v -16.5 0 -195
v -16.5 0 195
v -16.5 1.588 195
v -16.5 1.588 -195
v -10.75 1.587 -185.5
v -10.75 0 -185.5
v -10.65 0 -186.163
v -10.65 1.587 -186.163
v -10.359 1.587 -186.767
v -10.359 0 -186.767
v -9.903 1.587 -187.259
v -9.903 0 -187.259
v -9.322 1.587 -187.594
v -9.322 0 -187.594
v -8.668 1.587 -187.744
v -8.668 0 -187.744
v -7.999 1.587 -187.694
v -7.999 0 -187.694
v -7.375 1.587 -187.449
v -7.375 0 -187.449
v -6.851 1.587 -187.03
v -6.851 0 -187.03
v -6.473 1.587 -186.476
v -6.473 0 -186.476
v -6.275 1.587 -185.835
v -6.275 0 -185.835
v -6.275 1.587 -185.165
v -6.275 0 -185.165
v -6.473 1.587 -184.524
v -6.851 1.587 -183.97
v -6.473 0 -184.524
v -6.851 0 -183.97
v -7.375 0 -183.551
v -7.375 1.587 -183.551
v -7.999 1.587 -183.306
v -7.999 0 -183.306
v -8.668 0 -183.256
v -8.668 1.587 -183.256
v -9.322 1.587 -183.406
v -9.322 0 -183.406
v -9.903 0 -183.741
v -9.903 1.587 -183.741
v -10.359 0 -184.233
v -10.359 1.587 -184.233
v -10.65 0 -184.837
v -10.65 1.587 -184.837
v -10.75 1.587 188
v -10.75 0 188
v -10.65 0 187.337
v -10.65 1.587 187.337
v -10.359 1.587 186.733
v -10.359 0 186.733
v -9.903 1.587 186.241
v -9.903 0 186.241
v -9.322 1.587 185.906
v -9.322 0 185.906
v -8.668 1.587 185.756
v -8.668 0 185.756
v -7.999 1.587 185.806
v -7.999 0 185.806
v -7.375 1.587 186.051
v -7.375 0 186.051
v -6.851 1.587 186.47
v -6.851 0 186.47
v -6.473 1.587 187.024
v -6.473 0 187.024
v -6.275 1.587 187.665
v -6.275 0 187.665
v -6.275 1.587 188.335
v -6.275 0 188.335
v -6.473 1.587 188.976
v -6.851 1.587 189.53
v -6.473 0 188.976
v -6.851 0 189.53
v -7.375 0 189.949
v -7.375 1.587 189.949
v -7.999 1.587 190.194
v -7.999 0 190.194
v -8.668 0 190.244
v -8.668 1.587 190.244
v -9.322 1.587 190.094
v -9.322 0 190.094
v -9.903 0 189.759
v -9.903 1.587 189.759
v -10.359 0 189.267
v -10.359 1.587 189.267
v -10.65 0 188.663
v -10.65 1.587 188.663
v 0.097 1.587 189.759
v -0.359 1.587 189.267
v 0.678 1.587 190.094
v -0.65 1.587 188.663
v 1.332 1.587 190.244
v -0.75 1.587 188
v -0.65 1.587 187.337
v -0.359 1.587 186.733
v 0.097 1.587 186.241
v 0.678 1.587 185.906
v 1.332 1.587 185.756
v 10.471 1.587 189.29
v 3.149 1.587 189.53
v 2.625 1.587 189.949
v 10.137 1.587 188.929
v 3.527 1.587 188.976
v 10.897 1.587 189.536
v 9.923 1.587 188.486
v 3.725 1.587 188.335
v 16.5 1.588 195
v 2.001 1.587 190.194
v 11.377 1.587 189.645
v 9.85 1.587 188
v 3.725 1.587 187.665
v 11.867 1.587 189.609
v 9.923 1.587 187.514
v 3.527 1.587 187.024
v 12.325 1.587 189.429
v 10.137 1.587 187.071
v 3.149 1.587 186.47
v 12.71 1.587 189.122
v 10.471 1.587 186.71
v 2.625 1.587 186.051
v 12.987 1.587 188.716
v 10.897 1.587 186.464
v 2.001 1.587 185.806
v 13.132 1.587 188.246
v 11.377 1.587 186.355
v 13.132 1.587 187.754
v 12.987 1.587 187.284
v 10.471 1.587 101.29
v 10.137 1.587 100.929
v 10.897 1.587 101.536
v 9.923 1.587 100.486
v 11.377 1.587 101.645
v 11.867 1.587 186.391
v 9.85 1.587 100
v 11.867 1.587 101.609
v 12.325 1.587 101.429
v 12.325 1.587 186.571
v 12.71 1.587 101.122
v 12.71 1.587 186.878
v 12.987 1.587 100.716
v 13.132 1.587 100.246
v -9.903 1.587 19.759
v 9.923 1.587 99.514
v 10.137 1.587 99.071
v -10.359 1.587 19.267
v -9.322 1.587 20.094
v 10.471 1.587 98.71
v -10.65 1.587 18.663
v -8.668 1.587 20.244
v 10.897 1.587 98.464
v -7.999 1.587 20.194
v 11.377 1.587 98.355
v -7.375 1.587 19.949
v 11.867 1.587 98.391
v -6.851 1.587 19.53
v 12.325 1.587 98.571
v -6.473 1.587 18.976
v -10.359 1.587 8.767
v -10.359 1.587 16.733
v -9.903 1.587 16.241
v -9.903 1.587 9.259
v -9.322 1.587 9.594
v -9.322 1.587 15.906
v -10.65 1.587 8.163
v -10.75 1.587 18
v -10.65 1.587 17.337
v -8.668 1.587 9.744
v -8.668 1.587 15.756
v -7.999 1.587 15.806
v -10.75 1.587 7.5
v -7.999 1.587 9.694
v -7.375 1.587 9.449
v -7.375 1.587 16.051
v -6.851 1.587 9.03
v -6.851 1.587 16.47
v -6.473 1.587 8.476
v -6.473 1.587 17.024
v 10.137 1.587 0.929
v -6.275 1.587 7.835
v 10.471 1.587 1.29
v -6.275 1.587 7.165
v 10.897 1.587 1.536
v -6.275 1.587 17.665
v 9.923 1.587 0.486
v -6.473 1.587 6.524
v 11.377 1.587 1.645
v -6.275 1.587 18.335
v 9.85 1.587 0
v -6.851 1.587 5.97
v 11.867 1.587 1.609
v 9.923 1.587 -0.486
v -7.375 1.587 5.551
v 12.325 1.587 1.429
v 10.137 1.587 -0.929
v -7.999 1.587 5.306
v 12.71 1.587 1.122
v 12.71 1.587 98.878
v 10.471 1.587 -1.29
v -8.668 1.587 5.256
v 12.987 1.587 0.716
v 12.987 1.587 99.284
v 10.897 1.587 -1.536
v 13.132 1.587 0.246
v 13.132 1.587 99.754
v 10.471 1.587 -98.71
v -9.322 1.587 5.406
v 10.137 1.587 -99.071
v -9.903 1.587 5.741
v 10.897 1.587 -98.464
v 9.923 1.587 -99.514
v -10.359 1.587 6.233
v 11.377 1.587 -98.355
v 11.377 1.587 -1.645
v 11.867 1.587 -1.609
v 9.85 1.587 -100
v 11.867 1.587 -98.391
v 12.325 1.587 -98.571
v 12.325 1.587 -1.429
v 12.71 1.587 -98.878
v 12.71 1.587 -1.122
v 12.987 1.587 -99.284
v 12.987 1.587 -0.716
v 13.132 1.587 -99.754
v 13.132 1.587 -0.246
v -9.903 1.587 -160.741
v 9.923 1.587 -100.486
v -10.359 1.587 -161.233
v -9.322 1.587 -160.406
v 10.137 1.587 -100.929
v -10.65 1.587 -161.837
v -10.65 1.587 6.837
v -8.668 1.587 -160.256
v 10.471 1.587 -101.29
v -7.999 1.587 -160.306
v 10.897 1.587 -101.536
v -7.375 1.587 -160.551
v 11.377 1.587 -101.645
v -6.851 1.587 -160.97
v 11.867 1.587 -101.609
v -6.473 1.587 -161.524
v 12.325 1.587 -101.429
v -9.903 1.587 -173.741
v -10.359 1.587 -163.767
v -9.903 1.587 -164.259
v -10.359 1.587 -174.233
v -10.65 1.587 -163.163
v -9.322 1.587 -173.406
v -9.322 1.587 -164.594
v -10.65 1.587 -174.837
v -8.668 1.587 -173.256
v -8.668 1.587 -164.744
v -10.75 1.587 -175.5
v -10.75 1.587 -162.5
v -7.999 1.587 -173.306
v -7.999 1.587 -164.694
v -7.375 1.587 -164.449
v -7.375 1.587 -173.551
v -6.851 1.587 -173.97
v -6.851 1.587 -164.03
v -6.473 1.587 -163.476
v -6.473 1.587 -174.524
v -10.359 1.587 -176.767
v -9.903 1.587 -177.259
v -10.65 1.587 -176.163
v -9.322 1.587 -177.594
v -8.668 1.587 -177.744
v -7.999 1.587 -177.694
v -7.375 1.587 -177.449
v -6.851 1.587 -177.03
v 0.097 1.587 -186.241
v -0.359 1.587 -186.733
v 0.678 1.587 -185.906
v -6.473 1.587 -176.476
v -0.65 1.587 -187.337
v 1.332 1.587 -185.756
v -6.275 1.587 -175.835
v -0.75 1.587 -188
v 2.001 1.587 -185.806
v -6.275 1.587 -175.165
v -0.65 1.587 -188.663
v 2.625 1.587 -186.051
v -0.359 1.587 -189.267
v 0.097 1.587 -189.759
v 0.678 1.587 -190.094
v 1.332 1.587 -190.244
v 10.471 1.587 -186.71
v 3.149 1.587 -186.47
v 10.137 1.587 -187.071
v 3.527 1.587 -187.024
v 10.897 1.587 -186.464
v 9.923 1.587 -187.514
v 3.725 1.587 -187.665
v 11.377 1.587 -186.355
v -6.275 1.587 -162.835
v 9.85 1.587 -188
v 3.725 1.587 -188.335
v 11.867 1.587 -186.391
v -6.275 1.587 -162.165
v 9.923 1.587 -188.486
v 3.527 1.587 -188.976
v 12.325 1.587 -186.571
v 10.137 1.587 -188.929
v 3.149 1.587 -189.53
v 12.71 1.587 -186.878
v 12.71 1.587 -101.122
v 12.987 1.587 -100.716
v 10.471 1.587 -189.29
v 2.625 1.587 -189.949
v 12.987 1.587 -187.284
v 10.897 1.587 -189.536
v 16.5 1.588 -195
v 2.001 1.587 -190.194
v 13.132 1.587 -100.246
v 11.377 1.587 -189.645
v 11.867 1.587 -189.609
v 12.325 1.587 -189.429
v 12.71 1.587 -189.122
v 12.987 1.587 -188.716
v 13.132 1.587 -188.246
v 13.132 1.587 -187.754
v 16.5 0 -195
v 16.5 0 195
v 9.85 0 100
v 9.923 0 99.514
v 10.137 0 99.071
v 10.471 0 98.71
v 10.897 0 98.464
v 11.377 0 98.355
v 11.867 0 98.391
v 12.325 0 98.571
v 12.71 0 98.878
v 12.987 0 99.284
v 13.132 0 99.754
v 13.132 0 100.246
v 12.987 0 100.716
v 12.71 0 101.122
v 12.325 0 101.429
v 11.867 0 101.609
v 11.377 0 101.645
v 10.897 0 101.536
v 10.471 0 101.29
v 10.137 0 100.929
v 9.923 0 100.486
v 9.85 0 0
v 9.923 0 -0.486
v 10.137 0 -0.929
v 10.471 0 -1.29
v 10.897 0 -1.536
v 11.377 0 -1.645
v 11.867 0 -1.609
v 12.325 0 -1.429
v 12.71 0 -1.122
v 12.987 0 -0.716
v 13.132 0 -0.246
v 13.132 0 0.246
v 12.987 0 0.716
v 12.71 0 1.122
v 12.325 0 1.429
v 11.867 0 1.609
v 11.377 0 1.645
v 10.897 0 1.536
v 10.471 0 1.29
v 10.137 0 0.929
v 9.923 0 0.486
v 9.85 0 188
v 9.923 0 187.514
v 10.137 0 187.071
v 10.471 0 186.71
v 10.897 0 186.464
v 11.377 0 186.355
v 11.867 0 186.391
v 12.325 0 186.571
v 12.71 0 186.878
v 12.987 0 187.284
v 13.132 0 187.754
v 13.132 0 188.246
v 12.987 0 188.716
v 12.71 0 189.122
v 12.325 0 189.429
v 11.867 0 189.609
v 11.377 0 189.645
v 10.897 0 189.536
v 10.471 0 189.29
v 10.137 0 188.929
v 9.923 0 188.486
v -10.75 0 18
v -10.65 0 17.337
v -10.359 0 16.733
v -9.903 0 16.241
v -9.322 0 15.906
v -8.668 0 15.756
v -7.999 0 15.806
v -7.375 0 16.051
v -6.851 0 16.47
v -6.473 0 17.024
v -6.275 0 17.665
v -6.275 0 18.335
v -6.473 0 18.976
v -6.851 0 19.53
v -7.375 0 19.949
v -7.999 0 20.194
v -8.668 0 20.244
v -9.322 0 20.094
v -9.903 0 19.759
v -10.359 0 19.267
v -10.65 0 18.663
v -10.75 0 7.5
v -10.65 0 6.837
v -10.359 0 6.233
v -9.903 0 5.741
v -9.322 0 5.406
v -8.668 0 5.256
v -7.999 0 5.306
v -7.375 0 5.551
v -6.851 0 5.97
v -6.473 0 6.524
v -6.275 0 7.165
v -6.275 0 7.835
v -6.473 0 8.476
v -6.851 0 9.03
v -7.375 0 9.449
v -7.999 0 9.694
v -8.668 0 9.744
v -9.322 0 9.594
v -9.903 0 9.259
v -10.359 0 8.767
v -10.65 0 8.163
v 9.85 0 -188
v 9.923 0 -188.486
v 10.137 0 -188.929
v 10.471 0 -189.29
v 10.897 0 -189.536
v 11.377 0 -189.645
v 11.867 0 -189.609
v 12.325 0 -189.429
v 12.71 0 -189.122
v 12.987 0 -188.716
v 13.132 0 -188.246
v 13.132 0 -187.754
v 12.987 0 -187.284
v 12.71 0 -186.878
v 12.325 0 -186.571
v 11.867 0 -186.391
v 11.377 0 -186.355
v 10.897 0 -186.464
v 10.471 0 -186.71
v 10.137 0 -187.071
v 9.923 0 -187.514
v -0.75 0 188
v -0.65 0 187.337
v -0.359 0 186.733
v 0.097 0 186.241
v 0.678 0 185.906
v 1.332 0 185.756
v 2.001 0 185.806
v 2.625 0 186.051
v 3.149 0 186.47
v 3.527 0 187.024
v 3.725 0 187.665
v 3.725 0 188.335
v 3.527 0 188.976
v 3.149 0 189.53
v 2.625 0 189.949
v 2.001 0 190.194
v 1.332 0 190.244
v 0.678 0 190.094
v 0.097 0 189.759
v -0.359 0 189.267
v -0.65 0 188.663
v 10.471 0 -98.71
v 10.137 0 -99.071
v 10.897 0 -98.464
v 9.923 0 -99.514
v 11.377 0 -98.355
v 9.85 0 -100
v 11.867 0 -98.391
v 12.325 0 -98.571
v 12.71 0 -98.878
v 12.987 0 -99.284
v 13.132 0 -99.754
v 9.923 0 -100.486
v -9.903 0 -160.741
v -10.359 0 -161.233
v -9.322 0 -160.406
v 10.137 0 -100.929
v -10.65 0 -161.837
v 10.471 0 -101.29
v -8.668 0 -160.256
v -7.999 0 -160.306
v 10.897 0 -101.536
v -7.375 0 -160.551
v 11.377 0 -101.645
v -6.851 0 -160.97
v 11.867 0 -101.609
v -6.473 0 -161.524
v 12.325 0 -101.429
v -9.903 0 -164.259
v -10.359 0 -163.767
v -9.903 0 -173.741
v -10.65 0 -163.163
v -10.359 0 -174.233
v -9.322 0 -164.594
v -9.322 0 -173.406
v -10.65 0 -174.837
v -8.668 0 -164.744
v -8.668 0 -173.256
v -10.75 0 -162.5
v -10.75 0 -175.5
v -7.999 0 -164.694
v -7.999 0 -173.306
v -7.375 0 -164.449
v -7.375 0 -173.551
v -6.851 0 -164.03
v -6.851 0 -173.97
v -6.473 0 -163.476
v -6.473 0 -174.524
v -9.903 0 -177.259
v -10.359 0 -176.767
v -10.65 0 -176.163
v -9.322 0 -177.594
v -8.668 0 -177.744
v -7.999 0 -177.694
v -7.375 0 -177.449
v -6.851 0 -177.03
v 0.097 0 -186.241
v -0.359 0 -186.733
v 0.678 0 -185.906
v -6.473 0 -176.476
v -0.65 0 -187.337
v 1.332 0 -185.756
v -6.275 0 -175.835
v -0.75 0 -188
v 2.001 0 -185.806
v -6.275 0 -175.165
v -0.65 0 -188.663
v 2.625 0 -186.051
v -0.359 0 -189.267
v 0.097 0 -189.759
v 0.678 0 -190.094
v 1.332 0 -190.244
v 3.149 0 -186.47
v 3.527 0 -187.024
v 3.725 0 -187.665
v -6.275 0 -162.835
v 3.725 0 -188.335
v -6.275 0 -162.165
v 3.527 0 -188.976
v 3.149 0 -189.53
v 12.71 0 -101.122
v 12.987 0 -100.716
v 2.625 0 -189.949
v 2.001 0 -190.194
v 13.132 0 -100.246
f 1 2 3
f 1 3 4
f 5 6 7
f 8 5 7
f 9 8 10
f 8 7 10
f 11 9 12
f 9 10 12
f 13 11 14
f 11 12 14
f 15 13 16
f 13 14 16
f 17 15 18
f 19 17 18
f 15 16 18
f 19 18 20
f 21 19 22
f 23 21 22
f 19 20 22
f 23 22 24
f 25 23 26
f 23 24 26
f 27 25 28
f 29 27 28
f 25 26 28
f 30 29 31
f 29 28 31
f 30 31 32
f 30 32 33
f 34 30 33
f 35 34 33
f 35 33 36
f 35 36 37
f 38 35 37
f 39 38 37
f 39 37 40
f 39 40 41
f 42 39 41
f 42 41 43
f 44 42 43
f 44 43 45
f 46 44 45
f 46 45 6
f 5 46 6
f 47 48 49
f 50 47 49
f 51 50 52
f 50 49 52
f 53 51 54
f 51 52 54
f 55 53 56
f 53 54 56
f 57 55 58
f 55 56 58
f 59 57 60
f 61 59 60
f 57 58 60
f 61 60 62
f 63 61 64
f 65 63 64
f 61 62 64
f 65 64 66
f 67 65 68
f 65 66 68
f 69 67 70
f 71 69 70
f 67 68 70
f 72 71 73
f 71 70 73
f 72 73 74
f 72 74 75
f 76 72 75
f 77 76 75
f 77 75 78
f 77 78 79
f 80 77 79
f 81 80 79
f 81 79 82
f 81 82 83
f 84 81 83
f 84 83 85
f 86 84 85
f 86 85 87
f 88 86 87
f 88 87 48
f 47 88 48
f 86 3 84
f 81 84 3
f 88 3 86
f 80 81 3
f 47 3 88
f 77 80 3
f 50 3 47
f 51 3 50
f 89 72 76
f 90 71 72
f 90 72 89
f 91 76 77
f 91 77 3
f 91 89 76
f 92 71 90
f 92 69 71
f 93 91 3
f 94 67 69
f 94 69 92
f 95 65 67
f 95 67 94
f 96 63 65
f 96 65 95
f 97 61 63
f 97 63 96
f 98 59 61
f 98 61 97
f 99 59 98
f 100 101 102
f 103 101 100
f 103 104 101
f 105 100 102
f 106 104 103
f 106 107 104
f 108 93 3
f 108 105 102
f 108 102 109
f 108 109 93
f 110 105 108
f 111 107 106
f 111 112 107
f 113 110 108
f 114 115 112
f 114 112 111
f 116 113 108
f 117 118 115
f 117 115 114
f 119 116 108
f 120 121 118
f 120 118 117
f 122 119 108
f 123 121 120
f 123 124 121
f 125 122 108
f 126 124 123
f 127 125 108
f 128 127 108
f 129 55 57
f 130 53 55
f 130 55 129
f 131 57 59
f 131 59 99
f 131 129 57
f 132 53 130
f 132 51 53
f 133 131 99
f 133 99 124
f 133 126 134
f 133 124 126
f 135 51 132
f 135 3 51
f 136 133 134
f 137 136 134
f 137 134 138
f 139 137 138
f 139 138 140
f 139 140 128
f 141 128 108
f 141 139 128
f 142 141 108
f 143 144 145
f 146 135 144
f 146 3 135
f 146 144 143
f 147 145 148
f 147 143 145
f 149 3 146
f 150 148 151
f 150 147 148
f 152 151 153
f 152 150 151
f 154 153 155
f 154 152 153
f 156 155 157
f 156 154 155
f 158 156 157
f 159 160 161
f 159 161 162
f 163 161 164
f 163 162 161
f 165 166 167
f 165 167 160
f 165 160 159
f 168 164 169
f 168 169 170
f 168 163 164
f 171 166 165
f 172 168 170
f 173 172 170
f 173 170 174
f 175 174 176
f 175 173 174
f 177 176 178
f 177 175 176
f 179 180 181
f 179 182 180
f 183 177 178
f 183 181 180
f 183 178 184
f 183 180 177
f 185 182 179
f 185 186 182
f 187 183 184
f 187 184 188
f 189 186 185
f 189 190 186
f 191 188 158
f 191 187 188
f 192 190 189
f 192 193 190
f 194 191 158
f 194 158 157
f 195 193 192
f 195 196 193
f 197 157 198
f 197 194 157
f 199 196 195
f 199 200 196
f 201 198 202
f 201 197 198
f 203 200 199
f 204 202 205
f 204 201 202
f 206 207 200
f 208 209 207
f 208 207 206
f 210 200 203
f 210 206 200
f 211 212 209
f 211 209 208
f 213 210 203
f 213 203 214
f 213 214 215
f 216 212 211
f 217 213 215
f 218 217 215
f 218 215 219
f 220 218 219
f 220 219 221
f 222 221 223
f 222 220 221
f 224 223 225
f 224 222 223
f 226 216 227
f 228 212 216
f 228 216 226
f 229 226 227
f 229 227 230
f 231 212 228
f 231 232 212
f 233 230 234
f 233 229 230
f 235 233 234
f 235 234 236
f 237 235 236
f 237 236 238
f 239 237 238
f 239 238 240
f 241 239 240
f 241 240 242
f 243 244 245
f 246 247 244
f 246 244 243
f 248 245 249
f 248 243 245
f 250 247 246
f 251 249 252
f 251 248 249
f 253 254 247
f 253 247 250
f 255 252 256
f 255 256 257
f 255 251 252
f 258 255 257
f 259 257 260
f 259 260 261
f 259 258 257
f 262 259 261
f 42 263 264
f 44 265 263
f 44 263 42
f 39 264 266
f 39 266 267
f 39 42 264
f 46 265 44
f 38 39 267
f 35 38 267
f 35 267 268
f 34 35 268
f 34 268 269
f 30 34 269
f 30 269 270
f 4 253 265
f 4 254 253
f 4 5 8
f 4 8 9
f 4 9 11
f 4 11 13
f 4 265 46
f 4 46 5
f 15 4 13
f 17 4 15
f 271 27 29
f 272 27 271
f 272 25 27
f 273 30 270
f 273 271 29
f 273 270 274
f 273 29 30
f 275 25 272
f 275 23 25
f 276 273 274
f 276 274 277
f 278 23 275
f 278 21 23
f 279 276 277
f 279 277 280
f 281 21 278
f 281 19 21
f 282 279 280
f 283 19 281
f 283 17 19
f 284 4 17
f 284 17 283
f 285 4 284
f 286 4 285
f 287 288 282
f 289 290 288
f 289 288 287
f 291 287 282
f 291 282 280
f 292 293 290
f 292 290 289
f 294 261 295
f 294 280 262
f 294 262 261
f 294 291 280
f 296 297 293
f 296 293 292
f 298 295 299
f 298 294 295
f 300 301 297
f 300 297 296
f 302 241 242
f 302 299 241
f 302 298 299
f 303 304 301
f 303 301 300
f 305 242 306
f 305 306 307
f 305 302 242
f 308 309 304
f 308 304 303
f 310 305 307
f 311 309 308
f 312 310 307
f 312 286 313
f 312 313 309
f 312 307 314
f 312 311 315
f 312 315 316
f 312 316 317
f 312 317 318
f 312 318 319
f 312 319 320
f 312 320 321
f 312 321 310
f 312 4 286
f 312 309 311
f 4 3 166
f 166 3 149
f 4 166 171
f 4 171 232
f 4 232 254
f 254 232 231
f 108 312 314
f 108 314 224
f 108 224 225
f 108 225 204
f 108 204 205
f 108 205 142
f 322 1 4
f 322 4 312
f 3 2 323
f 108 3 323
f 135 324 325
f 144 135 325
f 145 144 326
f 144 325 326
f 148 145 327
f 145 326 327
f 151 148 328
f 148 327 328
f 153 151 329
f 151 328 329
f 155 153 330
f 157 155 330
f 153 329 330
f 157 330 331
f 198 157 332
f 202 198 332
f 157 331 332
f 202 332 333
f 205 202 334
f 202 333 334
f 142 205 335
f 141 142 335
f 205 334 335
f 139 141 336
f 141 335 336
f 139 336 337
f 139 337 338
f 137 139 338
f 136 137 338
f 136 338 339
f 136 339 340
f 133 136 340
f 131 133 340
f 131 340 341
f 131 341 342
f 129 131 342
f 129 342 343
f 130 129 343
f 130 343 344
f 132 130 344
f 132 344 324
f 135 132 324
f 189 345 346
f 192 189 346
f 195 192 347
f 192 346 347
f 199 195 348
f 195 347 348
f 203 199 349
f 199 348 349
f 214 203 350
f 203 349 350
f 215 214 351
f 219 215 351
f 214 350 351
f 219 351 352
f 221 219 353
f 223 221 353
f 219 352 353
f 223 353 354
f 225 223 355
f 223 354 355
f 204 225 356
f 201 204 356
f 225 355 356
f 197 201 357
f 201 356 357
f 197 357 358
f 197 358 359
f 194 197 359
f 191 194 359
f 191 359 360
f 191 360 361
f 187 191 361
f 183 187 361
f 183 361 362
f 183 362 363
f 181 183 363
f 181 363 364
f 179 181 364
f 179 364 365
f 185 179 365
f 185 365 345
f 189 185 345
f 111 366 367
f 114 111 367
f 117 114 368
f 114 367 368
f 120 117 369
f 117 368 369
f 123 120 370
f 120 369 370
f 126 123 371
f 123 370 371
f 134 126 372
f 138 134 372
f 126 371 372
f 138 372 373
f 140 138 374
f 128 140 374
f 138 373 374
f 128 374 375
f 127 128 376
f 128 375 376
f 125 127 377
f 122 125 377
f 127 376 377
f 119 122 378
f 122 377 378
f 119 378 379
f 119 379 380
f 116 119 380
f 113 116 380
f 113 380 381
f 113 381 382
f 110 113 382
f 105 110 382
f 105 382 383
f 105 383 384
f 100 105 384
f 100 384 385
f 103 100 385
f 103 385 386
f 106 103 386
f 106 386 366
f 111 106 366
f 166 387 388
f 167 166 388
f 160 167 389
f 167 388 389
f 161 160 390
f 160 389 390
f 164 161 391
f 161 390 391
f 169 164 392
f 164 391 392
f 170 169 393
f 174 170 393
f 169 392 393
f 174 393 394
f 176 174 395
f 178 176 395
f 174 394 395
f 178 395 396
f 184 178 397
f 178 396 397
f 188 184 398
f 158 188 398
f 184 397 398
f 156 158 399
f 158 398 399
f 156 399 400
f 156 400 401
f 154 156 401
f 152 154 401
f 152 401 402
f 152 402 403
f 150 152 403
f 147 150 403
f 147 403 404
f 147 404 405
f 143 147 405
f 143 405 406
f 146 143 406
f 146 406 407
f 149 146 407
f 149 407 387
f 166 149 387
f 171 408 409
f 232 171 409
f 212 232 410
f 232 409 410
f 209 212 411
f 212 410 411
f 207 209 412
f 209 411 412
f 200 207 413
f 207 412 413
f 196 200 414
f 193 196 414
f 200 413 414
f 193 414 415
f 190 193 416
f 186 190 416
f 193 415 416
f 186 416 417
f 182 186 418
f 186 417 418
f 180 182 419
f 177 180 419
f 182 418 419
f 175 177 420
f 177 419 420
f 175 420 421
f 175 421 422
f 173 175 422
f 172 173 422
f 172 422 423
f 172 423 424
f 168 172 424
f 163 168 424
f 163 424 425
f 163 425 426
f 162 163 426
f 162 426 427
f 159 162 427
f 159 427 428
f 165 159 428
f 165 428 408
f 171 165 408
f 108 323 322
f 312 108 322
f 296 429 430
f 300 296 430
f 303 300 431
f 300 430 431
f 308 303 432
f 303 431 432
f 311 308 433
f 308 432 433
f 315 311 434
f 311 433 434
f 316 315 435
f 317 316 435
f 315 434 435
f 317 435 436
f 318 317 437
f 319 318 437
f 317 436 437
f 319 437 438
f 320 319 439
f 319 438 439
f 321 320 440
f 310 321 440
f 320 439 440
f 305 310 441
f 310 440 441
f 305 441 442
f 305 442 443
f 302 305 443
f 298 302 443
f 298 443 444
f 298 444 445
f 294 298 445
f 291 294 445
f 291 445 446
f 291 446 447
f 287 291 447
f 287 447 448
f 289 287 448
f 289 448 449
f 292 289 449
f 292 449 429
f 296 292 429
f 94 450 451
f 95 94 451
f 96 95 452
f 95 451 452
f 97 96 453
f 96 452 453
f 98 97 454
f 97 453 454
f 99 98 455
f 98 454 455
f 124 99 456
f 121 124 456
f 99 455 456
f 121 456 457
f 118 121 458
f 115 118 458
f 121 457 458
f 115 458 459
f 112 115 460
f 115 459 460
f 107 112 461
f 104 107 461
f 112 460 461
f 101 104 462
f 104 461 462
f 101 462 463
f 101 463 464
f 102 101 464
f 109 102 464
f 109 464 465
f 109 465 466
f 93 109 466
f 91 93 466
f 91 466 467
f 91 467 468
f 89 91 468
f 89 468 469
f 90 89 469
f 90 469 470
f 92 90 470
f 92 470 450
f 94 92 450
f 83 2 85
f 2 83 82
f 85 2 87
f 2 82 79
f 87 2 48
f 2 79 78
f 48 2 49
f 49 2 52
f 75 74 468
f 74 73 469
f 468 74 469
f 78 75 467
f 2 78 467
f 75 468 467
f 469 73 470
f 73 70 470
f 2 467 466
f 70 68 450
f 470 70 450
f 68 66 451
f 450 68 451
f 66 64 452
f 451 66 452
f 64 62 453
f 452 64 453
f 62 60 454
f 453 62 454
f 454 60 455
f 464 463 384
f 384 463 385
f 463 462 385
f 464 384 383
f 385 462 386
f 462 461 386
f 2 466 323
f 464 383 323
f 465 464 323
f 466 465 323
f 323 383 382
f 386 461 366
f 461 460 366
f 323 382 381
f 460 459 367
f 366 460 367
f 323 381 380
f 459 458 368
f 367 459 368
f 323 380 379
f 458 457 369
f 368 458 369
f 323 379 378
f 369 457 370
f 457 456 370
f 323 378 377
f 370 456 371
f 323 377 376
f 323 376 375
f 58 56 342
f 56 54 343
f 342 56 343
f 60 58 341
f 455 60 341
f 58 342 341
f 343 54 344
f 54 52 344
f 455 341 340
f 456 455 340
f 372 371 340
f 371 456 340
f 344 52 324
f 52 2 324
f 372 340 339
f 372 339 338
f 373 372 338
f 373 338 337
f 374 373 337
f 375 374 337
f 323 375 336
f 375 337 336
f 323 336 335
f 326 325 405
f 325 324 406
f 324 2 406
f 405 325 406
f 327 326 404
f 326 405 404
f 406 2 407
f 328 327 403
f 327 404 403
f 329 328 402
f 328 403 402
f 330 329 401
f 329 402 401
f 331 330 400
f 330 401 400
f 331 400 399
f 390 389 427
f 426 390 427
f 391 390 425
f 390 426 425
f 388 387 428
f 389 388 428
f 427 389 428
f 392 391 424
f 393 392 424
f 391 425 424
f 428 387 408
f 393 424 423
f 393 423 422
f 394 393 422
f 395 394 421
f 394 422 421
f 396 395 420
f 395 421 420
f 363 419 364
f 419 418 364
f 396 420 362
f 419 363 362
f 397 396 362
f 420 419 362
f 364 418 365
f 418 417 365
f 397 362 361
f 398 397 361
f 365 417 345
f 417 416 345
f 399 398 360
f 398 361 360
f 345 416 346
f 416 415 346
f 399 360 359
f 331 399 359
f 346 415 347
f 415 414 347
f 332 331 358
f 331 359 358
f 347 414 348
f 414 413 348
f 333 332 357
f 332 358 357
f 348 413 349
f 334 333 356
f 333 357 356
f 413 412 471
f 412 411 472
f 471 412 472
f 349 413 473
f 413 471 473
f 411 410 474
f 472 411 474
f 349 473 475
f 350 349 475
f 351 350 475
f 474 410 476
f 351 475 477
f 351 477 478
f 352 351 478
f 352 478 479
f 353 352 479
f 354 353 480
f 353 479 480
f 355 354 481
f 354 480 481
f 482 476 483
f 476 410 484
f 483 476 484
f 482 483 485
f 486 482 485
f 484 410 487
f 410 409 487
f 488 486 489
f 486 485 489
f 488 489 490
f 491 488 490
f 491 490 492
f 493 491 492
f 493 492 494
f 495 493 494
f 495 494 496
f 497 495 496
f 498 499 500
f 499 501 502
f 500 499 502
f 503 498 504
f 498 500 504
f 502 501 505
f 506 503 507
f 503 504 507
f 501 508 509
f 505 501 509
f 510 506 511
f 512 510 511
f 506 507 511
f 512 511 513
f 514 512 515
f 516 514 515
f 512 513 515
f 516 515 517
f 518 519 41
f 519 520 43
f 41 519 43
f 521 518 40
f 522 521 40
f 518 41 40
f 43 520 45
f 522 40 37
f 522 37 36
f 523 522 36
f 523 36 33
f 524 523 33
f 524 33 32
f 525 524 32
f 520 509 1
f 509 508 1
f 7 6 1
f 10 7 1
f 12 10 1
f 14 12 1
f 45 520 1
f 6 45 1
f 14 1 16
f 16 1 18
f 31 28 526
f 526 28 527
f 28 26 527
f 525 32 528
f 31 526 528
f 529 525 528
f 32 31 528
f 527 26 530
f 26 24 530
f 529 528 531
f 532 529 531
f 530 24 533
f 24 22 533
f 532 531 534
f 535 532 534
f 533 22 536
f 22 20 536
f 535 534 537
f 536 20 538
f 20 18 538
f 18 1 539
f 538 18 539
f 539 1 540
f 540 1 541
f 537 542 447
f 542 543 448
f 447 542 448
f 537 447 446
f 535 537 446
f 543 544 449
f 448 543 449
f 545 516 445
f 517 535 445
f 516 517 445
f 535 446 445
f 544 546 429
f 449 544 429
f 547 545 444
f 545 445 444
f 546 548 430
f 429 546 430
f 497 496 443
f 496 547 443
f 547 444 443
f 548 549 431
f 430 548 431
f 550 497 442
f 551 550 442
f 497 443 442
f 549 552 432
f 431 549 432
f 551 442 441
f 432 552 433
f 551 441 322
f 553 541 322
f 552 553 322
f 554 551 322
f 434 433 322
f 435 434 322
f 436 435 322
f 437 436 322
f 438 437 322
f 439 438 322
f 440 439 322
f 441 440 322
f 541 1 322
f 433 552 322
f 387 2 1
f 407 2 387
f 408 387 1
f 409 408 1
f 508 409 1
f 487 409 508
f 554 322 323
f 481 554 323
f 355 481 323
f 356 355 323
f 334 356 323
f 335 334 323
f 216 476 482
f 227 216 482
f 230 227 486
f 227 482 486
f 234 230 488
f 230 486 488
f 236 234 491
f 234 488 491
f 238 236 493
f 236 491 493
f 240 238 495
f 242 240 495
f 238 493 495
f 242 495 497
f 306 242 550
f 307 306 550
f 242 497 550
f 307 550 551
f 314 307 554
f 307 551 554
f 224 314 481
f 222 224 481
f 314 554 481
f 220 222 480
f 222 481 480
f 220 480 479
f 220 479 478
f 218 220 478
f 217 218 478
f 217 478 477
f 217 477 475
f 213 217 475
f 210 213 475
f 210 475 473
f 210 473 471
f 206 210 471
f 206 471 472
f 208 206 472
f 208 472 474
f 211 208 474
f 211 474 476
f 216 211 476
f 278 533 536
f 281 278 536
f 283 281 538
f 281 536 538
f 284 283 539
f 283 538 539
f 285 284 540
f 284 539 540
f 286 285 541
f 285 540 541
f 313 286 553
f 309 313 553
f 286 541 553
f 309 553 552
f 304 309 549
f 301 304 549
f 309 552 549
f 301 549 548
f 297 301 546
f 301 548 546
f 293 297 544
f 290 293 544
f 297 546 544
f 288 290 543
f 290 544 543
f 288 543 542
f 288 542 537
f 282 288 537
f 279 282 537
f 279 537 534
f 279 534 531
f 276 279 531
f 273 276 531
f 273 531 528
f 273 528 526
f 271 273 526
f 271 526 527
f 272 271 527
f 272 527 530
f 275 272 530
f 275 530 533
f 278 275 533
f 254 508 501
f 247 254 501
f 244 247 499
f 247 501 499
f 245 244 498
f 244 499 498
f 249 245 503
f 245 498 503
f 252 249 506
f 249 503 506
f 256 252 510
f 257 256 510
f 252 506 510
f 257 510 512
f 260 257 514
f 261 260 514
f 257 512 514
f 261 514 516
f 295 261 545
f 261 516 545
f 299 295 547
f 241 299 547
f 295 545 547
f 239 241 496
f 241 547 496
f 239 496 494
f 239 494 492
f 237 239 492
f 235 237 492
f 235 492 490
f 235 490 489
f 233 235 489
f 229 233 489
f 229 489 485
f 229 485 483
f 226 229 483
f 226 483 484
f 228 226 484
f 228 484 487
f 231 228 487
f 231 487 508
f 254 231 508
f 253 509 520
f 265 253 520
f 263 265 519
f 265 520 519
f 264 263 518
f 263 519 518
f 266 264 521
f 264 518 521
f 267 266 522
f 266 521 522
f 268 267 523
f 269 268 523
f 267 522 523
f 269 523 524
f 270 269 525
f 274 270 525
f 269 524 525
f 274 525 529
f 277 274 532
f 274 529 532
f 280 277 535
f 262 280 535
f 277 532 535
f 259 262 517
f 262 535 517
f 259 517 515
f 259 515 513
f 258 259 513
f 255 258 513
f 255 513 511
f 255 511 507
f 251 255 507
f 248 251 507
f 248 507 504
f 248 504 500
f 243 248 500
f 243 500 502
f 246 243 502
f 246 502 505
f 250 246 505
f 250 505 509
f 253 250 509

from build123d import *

# Parameters (mm, degrees)
SKETCH1_W             = 33
SKETCH1_H             = 390
BOSS_EXTRUDE1_DEPTH   = 1.5875
M4_CLEARANCE_HOLE1_D  = 4.5
M4X0_7_TAPPED_HOLE1_D = 3.3


with BuildPart() as part:
    # Sketch1 → Boss-Extrude1 (new body)
    with BuildSketch(Plane(origin=(0, 0, 0), x_dir=(1, 0, 0), z_dir=(0, 1, 0))):
        Rectangle(SKETCH1_W, SKETCH1_H)
    extrude(amount=BOSS_EXTRUDE1_DEPTH)

    # M4 Clearance Hole1 (through all)
    with Locations(Plane(origin=(0, 1.5875, 0), x_dir=(1, 0, 0), z_dir=(0, 1, 0))):
        with Locations((1.5, 188), (-8.5, 185.5), (-8.5, 175.5), (-8.5, 162.5), (-8.5, -7.5), (-8.5, -18), (-8.5, -188), (1.5, -188)):
            Hole(M4_CLEARANCE_HOLE1_D / 2)

    # M4x0.7 Tapped Hole1 (through all)
    with Locations(Plane(origin=(0, 1.5875, 0), x_dir=(1, 0, 0), z_dir=(0, 1, 0))):
        with Locations((11.5, 188), (11.5, -188), (11.5, 100), (11.5, -100), (11.5, 0)):
            Hole(M4X0_7_TAPPED_HOLE1_D / 2)


solid = part.part
